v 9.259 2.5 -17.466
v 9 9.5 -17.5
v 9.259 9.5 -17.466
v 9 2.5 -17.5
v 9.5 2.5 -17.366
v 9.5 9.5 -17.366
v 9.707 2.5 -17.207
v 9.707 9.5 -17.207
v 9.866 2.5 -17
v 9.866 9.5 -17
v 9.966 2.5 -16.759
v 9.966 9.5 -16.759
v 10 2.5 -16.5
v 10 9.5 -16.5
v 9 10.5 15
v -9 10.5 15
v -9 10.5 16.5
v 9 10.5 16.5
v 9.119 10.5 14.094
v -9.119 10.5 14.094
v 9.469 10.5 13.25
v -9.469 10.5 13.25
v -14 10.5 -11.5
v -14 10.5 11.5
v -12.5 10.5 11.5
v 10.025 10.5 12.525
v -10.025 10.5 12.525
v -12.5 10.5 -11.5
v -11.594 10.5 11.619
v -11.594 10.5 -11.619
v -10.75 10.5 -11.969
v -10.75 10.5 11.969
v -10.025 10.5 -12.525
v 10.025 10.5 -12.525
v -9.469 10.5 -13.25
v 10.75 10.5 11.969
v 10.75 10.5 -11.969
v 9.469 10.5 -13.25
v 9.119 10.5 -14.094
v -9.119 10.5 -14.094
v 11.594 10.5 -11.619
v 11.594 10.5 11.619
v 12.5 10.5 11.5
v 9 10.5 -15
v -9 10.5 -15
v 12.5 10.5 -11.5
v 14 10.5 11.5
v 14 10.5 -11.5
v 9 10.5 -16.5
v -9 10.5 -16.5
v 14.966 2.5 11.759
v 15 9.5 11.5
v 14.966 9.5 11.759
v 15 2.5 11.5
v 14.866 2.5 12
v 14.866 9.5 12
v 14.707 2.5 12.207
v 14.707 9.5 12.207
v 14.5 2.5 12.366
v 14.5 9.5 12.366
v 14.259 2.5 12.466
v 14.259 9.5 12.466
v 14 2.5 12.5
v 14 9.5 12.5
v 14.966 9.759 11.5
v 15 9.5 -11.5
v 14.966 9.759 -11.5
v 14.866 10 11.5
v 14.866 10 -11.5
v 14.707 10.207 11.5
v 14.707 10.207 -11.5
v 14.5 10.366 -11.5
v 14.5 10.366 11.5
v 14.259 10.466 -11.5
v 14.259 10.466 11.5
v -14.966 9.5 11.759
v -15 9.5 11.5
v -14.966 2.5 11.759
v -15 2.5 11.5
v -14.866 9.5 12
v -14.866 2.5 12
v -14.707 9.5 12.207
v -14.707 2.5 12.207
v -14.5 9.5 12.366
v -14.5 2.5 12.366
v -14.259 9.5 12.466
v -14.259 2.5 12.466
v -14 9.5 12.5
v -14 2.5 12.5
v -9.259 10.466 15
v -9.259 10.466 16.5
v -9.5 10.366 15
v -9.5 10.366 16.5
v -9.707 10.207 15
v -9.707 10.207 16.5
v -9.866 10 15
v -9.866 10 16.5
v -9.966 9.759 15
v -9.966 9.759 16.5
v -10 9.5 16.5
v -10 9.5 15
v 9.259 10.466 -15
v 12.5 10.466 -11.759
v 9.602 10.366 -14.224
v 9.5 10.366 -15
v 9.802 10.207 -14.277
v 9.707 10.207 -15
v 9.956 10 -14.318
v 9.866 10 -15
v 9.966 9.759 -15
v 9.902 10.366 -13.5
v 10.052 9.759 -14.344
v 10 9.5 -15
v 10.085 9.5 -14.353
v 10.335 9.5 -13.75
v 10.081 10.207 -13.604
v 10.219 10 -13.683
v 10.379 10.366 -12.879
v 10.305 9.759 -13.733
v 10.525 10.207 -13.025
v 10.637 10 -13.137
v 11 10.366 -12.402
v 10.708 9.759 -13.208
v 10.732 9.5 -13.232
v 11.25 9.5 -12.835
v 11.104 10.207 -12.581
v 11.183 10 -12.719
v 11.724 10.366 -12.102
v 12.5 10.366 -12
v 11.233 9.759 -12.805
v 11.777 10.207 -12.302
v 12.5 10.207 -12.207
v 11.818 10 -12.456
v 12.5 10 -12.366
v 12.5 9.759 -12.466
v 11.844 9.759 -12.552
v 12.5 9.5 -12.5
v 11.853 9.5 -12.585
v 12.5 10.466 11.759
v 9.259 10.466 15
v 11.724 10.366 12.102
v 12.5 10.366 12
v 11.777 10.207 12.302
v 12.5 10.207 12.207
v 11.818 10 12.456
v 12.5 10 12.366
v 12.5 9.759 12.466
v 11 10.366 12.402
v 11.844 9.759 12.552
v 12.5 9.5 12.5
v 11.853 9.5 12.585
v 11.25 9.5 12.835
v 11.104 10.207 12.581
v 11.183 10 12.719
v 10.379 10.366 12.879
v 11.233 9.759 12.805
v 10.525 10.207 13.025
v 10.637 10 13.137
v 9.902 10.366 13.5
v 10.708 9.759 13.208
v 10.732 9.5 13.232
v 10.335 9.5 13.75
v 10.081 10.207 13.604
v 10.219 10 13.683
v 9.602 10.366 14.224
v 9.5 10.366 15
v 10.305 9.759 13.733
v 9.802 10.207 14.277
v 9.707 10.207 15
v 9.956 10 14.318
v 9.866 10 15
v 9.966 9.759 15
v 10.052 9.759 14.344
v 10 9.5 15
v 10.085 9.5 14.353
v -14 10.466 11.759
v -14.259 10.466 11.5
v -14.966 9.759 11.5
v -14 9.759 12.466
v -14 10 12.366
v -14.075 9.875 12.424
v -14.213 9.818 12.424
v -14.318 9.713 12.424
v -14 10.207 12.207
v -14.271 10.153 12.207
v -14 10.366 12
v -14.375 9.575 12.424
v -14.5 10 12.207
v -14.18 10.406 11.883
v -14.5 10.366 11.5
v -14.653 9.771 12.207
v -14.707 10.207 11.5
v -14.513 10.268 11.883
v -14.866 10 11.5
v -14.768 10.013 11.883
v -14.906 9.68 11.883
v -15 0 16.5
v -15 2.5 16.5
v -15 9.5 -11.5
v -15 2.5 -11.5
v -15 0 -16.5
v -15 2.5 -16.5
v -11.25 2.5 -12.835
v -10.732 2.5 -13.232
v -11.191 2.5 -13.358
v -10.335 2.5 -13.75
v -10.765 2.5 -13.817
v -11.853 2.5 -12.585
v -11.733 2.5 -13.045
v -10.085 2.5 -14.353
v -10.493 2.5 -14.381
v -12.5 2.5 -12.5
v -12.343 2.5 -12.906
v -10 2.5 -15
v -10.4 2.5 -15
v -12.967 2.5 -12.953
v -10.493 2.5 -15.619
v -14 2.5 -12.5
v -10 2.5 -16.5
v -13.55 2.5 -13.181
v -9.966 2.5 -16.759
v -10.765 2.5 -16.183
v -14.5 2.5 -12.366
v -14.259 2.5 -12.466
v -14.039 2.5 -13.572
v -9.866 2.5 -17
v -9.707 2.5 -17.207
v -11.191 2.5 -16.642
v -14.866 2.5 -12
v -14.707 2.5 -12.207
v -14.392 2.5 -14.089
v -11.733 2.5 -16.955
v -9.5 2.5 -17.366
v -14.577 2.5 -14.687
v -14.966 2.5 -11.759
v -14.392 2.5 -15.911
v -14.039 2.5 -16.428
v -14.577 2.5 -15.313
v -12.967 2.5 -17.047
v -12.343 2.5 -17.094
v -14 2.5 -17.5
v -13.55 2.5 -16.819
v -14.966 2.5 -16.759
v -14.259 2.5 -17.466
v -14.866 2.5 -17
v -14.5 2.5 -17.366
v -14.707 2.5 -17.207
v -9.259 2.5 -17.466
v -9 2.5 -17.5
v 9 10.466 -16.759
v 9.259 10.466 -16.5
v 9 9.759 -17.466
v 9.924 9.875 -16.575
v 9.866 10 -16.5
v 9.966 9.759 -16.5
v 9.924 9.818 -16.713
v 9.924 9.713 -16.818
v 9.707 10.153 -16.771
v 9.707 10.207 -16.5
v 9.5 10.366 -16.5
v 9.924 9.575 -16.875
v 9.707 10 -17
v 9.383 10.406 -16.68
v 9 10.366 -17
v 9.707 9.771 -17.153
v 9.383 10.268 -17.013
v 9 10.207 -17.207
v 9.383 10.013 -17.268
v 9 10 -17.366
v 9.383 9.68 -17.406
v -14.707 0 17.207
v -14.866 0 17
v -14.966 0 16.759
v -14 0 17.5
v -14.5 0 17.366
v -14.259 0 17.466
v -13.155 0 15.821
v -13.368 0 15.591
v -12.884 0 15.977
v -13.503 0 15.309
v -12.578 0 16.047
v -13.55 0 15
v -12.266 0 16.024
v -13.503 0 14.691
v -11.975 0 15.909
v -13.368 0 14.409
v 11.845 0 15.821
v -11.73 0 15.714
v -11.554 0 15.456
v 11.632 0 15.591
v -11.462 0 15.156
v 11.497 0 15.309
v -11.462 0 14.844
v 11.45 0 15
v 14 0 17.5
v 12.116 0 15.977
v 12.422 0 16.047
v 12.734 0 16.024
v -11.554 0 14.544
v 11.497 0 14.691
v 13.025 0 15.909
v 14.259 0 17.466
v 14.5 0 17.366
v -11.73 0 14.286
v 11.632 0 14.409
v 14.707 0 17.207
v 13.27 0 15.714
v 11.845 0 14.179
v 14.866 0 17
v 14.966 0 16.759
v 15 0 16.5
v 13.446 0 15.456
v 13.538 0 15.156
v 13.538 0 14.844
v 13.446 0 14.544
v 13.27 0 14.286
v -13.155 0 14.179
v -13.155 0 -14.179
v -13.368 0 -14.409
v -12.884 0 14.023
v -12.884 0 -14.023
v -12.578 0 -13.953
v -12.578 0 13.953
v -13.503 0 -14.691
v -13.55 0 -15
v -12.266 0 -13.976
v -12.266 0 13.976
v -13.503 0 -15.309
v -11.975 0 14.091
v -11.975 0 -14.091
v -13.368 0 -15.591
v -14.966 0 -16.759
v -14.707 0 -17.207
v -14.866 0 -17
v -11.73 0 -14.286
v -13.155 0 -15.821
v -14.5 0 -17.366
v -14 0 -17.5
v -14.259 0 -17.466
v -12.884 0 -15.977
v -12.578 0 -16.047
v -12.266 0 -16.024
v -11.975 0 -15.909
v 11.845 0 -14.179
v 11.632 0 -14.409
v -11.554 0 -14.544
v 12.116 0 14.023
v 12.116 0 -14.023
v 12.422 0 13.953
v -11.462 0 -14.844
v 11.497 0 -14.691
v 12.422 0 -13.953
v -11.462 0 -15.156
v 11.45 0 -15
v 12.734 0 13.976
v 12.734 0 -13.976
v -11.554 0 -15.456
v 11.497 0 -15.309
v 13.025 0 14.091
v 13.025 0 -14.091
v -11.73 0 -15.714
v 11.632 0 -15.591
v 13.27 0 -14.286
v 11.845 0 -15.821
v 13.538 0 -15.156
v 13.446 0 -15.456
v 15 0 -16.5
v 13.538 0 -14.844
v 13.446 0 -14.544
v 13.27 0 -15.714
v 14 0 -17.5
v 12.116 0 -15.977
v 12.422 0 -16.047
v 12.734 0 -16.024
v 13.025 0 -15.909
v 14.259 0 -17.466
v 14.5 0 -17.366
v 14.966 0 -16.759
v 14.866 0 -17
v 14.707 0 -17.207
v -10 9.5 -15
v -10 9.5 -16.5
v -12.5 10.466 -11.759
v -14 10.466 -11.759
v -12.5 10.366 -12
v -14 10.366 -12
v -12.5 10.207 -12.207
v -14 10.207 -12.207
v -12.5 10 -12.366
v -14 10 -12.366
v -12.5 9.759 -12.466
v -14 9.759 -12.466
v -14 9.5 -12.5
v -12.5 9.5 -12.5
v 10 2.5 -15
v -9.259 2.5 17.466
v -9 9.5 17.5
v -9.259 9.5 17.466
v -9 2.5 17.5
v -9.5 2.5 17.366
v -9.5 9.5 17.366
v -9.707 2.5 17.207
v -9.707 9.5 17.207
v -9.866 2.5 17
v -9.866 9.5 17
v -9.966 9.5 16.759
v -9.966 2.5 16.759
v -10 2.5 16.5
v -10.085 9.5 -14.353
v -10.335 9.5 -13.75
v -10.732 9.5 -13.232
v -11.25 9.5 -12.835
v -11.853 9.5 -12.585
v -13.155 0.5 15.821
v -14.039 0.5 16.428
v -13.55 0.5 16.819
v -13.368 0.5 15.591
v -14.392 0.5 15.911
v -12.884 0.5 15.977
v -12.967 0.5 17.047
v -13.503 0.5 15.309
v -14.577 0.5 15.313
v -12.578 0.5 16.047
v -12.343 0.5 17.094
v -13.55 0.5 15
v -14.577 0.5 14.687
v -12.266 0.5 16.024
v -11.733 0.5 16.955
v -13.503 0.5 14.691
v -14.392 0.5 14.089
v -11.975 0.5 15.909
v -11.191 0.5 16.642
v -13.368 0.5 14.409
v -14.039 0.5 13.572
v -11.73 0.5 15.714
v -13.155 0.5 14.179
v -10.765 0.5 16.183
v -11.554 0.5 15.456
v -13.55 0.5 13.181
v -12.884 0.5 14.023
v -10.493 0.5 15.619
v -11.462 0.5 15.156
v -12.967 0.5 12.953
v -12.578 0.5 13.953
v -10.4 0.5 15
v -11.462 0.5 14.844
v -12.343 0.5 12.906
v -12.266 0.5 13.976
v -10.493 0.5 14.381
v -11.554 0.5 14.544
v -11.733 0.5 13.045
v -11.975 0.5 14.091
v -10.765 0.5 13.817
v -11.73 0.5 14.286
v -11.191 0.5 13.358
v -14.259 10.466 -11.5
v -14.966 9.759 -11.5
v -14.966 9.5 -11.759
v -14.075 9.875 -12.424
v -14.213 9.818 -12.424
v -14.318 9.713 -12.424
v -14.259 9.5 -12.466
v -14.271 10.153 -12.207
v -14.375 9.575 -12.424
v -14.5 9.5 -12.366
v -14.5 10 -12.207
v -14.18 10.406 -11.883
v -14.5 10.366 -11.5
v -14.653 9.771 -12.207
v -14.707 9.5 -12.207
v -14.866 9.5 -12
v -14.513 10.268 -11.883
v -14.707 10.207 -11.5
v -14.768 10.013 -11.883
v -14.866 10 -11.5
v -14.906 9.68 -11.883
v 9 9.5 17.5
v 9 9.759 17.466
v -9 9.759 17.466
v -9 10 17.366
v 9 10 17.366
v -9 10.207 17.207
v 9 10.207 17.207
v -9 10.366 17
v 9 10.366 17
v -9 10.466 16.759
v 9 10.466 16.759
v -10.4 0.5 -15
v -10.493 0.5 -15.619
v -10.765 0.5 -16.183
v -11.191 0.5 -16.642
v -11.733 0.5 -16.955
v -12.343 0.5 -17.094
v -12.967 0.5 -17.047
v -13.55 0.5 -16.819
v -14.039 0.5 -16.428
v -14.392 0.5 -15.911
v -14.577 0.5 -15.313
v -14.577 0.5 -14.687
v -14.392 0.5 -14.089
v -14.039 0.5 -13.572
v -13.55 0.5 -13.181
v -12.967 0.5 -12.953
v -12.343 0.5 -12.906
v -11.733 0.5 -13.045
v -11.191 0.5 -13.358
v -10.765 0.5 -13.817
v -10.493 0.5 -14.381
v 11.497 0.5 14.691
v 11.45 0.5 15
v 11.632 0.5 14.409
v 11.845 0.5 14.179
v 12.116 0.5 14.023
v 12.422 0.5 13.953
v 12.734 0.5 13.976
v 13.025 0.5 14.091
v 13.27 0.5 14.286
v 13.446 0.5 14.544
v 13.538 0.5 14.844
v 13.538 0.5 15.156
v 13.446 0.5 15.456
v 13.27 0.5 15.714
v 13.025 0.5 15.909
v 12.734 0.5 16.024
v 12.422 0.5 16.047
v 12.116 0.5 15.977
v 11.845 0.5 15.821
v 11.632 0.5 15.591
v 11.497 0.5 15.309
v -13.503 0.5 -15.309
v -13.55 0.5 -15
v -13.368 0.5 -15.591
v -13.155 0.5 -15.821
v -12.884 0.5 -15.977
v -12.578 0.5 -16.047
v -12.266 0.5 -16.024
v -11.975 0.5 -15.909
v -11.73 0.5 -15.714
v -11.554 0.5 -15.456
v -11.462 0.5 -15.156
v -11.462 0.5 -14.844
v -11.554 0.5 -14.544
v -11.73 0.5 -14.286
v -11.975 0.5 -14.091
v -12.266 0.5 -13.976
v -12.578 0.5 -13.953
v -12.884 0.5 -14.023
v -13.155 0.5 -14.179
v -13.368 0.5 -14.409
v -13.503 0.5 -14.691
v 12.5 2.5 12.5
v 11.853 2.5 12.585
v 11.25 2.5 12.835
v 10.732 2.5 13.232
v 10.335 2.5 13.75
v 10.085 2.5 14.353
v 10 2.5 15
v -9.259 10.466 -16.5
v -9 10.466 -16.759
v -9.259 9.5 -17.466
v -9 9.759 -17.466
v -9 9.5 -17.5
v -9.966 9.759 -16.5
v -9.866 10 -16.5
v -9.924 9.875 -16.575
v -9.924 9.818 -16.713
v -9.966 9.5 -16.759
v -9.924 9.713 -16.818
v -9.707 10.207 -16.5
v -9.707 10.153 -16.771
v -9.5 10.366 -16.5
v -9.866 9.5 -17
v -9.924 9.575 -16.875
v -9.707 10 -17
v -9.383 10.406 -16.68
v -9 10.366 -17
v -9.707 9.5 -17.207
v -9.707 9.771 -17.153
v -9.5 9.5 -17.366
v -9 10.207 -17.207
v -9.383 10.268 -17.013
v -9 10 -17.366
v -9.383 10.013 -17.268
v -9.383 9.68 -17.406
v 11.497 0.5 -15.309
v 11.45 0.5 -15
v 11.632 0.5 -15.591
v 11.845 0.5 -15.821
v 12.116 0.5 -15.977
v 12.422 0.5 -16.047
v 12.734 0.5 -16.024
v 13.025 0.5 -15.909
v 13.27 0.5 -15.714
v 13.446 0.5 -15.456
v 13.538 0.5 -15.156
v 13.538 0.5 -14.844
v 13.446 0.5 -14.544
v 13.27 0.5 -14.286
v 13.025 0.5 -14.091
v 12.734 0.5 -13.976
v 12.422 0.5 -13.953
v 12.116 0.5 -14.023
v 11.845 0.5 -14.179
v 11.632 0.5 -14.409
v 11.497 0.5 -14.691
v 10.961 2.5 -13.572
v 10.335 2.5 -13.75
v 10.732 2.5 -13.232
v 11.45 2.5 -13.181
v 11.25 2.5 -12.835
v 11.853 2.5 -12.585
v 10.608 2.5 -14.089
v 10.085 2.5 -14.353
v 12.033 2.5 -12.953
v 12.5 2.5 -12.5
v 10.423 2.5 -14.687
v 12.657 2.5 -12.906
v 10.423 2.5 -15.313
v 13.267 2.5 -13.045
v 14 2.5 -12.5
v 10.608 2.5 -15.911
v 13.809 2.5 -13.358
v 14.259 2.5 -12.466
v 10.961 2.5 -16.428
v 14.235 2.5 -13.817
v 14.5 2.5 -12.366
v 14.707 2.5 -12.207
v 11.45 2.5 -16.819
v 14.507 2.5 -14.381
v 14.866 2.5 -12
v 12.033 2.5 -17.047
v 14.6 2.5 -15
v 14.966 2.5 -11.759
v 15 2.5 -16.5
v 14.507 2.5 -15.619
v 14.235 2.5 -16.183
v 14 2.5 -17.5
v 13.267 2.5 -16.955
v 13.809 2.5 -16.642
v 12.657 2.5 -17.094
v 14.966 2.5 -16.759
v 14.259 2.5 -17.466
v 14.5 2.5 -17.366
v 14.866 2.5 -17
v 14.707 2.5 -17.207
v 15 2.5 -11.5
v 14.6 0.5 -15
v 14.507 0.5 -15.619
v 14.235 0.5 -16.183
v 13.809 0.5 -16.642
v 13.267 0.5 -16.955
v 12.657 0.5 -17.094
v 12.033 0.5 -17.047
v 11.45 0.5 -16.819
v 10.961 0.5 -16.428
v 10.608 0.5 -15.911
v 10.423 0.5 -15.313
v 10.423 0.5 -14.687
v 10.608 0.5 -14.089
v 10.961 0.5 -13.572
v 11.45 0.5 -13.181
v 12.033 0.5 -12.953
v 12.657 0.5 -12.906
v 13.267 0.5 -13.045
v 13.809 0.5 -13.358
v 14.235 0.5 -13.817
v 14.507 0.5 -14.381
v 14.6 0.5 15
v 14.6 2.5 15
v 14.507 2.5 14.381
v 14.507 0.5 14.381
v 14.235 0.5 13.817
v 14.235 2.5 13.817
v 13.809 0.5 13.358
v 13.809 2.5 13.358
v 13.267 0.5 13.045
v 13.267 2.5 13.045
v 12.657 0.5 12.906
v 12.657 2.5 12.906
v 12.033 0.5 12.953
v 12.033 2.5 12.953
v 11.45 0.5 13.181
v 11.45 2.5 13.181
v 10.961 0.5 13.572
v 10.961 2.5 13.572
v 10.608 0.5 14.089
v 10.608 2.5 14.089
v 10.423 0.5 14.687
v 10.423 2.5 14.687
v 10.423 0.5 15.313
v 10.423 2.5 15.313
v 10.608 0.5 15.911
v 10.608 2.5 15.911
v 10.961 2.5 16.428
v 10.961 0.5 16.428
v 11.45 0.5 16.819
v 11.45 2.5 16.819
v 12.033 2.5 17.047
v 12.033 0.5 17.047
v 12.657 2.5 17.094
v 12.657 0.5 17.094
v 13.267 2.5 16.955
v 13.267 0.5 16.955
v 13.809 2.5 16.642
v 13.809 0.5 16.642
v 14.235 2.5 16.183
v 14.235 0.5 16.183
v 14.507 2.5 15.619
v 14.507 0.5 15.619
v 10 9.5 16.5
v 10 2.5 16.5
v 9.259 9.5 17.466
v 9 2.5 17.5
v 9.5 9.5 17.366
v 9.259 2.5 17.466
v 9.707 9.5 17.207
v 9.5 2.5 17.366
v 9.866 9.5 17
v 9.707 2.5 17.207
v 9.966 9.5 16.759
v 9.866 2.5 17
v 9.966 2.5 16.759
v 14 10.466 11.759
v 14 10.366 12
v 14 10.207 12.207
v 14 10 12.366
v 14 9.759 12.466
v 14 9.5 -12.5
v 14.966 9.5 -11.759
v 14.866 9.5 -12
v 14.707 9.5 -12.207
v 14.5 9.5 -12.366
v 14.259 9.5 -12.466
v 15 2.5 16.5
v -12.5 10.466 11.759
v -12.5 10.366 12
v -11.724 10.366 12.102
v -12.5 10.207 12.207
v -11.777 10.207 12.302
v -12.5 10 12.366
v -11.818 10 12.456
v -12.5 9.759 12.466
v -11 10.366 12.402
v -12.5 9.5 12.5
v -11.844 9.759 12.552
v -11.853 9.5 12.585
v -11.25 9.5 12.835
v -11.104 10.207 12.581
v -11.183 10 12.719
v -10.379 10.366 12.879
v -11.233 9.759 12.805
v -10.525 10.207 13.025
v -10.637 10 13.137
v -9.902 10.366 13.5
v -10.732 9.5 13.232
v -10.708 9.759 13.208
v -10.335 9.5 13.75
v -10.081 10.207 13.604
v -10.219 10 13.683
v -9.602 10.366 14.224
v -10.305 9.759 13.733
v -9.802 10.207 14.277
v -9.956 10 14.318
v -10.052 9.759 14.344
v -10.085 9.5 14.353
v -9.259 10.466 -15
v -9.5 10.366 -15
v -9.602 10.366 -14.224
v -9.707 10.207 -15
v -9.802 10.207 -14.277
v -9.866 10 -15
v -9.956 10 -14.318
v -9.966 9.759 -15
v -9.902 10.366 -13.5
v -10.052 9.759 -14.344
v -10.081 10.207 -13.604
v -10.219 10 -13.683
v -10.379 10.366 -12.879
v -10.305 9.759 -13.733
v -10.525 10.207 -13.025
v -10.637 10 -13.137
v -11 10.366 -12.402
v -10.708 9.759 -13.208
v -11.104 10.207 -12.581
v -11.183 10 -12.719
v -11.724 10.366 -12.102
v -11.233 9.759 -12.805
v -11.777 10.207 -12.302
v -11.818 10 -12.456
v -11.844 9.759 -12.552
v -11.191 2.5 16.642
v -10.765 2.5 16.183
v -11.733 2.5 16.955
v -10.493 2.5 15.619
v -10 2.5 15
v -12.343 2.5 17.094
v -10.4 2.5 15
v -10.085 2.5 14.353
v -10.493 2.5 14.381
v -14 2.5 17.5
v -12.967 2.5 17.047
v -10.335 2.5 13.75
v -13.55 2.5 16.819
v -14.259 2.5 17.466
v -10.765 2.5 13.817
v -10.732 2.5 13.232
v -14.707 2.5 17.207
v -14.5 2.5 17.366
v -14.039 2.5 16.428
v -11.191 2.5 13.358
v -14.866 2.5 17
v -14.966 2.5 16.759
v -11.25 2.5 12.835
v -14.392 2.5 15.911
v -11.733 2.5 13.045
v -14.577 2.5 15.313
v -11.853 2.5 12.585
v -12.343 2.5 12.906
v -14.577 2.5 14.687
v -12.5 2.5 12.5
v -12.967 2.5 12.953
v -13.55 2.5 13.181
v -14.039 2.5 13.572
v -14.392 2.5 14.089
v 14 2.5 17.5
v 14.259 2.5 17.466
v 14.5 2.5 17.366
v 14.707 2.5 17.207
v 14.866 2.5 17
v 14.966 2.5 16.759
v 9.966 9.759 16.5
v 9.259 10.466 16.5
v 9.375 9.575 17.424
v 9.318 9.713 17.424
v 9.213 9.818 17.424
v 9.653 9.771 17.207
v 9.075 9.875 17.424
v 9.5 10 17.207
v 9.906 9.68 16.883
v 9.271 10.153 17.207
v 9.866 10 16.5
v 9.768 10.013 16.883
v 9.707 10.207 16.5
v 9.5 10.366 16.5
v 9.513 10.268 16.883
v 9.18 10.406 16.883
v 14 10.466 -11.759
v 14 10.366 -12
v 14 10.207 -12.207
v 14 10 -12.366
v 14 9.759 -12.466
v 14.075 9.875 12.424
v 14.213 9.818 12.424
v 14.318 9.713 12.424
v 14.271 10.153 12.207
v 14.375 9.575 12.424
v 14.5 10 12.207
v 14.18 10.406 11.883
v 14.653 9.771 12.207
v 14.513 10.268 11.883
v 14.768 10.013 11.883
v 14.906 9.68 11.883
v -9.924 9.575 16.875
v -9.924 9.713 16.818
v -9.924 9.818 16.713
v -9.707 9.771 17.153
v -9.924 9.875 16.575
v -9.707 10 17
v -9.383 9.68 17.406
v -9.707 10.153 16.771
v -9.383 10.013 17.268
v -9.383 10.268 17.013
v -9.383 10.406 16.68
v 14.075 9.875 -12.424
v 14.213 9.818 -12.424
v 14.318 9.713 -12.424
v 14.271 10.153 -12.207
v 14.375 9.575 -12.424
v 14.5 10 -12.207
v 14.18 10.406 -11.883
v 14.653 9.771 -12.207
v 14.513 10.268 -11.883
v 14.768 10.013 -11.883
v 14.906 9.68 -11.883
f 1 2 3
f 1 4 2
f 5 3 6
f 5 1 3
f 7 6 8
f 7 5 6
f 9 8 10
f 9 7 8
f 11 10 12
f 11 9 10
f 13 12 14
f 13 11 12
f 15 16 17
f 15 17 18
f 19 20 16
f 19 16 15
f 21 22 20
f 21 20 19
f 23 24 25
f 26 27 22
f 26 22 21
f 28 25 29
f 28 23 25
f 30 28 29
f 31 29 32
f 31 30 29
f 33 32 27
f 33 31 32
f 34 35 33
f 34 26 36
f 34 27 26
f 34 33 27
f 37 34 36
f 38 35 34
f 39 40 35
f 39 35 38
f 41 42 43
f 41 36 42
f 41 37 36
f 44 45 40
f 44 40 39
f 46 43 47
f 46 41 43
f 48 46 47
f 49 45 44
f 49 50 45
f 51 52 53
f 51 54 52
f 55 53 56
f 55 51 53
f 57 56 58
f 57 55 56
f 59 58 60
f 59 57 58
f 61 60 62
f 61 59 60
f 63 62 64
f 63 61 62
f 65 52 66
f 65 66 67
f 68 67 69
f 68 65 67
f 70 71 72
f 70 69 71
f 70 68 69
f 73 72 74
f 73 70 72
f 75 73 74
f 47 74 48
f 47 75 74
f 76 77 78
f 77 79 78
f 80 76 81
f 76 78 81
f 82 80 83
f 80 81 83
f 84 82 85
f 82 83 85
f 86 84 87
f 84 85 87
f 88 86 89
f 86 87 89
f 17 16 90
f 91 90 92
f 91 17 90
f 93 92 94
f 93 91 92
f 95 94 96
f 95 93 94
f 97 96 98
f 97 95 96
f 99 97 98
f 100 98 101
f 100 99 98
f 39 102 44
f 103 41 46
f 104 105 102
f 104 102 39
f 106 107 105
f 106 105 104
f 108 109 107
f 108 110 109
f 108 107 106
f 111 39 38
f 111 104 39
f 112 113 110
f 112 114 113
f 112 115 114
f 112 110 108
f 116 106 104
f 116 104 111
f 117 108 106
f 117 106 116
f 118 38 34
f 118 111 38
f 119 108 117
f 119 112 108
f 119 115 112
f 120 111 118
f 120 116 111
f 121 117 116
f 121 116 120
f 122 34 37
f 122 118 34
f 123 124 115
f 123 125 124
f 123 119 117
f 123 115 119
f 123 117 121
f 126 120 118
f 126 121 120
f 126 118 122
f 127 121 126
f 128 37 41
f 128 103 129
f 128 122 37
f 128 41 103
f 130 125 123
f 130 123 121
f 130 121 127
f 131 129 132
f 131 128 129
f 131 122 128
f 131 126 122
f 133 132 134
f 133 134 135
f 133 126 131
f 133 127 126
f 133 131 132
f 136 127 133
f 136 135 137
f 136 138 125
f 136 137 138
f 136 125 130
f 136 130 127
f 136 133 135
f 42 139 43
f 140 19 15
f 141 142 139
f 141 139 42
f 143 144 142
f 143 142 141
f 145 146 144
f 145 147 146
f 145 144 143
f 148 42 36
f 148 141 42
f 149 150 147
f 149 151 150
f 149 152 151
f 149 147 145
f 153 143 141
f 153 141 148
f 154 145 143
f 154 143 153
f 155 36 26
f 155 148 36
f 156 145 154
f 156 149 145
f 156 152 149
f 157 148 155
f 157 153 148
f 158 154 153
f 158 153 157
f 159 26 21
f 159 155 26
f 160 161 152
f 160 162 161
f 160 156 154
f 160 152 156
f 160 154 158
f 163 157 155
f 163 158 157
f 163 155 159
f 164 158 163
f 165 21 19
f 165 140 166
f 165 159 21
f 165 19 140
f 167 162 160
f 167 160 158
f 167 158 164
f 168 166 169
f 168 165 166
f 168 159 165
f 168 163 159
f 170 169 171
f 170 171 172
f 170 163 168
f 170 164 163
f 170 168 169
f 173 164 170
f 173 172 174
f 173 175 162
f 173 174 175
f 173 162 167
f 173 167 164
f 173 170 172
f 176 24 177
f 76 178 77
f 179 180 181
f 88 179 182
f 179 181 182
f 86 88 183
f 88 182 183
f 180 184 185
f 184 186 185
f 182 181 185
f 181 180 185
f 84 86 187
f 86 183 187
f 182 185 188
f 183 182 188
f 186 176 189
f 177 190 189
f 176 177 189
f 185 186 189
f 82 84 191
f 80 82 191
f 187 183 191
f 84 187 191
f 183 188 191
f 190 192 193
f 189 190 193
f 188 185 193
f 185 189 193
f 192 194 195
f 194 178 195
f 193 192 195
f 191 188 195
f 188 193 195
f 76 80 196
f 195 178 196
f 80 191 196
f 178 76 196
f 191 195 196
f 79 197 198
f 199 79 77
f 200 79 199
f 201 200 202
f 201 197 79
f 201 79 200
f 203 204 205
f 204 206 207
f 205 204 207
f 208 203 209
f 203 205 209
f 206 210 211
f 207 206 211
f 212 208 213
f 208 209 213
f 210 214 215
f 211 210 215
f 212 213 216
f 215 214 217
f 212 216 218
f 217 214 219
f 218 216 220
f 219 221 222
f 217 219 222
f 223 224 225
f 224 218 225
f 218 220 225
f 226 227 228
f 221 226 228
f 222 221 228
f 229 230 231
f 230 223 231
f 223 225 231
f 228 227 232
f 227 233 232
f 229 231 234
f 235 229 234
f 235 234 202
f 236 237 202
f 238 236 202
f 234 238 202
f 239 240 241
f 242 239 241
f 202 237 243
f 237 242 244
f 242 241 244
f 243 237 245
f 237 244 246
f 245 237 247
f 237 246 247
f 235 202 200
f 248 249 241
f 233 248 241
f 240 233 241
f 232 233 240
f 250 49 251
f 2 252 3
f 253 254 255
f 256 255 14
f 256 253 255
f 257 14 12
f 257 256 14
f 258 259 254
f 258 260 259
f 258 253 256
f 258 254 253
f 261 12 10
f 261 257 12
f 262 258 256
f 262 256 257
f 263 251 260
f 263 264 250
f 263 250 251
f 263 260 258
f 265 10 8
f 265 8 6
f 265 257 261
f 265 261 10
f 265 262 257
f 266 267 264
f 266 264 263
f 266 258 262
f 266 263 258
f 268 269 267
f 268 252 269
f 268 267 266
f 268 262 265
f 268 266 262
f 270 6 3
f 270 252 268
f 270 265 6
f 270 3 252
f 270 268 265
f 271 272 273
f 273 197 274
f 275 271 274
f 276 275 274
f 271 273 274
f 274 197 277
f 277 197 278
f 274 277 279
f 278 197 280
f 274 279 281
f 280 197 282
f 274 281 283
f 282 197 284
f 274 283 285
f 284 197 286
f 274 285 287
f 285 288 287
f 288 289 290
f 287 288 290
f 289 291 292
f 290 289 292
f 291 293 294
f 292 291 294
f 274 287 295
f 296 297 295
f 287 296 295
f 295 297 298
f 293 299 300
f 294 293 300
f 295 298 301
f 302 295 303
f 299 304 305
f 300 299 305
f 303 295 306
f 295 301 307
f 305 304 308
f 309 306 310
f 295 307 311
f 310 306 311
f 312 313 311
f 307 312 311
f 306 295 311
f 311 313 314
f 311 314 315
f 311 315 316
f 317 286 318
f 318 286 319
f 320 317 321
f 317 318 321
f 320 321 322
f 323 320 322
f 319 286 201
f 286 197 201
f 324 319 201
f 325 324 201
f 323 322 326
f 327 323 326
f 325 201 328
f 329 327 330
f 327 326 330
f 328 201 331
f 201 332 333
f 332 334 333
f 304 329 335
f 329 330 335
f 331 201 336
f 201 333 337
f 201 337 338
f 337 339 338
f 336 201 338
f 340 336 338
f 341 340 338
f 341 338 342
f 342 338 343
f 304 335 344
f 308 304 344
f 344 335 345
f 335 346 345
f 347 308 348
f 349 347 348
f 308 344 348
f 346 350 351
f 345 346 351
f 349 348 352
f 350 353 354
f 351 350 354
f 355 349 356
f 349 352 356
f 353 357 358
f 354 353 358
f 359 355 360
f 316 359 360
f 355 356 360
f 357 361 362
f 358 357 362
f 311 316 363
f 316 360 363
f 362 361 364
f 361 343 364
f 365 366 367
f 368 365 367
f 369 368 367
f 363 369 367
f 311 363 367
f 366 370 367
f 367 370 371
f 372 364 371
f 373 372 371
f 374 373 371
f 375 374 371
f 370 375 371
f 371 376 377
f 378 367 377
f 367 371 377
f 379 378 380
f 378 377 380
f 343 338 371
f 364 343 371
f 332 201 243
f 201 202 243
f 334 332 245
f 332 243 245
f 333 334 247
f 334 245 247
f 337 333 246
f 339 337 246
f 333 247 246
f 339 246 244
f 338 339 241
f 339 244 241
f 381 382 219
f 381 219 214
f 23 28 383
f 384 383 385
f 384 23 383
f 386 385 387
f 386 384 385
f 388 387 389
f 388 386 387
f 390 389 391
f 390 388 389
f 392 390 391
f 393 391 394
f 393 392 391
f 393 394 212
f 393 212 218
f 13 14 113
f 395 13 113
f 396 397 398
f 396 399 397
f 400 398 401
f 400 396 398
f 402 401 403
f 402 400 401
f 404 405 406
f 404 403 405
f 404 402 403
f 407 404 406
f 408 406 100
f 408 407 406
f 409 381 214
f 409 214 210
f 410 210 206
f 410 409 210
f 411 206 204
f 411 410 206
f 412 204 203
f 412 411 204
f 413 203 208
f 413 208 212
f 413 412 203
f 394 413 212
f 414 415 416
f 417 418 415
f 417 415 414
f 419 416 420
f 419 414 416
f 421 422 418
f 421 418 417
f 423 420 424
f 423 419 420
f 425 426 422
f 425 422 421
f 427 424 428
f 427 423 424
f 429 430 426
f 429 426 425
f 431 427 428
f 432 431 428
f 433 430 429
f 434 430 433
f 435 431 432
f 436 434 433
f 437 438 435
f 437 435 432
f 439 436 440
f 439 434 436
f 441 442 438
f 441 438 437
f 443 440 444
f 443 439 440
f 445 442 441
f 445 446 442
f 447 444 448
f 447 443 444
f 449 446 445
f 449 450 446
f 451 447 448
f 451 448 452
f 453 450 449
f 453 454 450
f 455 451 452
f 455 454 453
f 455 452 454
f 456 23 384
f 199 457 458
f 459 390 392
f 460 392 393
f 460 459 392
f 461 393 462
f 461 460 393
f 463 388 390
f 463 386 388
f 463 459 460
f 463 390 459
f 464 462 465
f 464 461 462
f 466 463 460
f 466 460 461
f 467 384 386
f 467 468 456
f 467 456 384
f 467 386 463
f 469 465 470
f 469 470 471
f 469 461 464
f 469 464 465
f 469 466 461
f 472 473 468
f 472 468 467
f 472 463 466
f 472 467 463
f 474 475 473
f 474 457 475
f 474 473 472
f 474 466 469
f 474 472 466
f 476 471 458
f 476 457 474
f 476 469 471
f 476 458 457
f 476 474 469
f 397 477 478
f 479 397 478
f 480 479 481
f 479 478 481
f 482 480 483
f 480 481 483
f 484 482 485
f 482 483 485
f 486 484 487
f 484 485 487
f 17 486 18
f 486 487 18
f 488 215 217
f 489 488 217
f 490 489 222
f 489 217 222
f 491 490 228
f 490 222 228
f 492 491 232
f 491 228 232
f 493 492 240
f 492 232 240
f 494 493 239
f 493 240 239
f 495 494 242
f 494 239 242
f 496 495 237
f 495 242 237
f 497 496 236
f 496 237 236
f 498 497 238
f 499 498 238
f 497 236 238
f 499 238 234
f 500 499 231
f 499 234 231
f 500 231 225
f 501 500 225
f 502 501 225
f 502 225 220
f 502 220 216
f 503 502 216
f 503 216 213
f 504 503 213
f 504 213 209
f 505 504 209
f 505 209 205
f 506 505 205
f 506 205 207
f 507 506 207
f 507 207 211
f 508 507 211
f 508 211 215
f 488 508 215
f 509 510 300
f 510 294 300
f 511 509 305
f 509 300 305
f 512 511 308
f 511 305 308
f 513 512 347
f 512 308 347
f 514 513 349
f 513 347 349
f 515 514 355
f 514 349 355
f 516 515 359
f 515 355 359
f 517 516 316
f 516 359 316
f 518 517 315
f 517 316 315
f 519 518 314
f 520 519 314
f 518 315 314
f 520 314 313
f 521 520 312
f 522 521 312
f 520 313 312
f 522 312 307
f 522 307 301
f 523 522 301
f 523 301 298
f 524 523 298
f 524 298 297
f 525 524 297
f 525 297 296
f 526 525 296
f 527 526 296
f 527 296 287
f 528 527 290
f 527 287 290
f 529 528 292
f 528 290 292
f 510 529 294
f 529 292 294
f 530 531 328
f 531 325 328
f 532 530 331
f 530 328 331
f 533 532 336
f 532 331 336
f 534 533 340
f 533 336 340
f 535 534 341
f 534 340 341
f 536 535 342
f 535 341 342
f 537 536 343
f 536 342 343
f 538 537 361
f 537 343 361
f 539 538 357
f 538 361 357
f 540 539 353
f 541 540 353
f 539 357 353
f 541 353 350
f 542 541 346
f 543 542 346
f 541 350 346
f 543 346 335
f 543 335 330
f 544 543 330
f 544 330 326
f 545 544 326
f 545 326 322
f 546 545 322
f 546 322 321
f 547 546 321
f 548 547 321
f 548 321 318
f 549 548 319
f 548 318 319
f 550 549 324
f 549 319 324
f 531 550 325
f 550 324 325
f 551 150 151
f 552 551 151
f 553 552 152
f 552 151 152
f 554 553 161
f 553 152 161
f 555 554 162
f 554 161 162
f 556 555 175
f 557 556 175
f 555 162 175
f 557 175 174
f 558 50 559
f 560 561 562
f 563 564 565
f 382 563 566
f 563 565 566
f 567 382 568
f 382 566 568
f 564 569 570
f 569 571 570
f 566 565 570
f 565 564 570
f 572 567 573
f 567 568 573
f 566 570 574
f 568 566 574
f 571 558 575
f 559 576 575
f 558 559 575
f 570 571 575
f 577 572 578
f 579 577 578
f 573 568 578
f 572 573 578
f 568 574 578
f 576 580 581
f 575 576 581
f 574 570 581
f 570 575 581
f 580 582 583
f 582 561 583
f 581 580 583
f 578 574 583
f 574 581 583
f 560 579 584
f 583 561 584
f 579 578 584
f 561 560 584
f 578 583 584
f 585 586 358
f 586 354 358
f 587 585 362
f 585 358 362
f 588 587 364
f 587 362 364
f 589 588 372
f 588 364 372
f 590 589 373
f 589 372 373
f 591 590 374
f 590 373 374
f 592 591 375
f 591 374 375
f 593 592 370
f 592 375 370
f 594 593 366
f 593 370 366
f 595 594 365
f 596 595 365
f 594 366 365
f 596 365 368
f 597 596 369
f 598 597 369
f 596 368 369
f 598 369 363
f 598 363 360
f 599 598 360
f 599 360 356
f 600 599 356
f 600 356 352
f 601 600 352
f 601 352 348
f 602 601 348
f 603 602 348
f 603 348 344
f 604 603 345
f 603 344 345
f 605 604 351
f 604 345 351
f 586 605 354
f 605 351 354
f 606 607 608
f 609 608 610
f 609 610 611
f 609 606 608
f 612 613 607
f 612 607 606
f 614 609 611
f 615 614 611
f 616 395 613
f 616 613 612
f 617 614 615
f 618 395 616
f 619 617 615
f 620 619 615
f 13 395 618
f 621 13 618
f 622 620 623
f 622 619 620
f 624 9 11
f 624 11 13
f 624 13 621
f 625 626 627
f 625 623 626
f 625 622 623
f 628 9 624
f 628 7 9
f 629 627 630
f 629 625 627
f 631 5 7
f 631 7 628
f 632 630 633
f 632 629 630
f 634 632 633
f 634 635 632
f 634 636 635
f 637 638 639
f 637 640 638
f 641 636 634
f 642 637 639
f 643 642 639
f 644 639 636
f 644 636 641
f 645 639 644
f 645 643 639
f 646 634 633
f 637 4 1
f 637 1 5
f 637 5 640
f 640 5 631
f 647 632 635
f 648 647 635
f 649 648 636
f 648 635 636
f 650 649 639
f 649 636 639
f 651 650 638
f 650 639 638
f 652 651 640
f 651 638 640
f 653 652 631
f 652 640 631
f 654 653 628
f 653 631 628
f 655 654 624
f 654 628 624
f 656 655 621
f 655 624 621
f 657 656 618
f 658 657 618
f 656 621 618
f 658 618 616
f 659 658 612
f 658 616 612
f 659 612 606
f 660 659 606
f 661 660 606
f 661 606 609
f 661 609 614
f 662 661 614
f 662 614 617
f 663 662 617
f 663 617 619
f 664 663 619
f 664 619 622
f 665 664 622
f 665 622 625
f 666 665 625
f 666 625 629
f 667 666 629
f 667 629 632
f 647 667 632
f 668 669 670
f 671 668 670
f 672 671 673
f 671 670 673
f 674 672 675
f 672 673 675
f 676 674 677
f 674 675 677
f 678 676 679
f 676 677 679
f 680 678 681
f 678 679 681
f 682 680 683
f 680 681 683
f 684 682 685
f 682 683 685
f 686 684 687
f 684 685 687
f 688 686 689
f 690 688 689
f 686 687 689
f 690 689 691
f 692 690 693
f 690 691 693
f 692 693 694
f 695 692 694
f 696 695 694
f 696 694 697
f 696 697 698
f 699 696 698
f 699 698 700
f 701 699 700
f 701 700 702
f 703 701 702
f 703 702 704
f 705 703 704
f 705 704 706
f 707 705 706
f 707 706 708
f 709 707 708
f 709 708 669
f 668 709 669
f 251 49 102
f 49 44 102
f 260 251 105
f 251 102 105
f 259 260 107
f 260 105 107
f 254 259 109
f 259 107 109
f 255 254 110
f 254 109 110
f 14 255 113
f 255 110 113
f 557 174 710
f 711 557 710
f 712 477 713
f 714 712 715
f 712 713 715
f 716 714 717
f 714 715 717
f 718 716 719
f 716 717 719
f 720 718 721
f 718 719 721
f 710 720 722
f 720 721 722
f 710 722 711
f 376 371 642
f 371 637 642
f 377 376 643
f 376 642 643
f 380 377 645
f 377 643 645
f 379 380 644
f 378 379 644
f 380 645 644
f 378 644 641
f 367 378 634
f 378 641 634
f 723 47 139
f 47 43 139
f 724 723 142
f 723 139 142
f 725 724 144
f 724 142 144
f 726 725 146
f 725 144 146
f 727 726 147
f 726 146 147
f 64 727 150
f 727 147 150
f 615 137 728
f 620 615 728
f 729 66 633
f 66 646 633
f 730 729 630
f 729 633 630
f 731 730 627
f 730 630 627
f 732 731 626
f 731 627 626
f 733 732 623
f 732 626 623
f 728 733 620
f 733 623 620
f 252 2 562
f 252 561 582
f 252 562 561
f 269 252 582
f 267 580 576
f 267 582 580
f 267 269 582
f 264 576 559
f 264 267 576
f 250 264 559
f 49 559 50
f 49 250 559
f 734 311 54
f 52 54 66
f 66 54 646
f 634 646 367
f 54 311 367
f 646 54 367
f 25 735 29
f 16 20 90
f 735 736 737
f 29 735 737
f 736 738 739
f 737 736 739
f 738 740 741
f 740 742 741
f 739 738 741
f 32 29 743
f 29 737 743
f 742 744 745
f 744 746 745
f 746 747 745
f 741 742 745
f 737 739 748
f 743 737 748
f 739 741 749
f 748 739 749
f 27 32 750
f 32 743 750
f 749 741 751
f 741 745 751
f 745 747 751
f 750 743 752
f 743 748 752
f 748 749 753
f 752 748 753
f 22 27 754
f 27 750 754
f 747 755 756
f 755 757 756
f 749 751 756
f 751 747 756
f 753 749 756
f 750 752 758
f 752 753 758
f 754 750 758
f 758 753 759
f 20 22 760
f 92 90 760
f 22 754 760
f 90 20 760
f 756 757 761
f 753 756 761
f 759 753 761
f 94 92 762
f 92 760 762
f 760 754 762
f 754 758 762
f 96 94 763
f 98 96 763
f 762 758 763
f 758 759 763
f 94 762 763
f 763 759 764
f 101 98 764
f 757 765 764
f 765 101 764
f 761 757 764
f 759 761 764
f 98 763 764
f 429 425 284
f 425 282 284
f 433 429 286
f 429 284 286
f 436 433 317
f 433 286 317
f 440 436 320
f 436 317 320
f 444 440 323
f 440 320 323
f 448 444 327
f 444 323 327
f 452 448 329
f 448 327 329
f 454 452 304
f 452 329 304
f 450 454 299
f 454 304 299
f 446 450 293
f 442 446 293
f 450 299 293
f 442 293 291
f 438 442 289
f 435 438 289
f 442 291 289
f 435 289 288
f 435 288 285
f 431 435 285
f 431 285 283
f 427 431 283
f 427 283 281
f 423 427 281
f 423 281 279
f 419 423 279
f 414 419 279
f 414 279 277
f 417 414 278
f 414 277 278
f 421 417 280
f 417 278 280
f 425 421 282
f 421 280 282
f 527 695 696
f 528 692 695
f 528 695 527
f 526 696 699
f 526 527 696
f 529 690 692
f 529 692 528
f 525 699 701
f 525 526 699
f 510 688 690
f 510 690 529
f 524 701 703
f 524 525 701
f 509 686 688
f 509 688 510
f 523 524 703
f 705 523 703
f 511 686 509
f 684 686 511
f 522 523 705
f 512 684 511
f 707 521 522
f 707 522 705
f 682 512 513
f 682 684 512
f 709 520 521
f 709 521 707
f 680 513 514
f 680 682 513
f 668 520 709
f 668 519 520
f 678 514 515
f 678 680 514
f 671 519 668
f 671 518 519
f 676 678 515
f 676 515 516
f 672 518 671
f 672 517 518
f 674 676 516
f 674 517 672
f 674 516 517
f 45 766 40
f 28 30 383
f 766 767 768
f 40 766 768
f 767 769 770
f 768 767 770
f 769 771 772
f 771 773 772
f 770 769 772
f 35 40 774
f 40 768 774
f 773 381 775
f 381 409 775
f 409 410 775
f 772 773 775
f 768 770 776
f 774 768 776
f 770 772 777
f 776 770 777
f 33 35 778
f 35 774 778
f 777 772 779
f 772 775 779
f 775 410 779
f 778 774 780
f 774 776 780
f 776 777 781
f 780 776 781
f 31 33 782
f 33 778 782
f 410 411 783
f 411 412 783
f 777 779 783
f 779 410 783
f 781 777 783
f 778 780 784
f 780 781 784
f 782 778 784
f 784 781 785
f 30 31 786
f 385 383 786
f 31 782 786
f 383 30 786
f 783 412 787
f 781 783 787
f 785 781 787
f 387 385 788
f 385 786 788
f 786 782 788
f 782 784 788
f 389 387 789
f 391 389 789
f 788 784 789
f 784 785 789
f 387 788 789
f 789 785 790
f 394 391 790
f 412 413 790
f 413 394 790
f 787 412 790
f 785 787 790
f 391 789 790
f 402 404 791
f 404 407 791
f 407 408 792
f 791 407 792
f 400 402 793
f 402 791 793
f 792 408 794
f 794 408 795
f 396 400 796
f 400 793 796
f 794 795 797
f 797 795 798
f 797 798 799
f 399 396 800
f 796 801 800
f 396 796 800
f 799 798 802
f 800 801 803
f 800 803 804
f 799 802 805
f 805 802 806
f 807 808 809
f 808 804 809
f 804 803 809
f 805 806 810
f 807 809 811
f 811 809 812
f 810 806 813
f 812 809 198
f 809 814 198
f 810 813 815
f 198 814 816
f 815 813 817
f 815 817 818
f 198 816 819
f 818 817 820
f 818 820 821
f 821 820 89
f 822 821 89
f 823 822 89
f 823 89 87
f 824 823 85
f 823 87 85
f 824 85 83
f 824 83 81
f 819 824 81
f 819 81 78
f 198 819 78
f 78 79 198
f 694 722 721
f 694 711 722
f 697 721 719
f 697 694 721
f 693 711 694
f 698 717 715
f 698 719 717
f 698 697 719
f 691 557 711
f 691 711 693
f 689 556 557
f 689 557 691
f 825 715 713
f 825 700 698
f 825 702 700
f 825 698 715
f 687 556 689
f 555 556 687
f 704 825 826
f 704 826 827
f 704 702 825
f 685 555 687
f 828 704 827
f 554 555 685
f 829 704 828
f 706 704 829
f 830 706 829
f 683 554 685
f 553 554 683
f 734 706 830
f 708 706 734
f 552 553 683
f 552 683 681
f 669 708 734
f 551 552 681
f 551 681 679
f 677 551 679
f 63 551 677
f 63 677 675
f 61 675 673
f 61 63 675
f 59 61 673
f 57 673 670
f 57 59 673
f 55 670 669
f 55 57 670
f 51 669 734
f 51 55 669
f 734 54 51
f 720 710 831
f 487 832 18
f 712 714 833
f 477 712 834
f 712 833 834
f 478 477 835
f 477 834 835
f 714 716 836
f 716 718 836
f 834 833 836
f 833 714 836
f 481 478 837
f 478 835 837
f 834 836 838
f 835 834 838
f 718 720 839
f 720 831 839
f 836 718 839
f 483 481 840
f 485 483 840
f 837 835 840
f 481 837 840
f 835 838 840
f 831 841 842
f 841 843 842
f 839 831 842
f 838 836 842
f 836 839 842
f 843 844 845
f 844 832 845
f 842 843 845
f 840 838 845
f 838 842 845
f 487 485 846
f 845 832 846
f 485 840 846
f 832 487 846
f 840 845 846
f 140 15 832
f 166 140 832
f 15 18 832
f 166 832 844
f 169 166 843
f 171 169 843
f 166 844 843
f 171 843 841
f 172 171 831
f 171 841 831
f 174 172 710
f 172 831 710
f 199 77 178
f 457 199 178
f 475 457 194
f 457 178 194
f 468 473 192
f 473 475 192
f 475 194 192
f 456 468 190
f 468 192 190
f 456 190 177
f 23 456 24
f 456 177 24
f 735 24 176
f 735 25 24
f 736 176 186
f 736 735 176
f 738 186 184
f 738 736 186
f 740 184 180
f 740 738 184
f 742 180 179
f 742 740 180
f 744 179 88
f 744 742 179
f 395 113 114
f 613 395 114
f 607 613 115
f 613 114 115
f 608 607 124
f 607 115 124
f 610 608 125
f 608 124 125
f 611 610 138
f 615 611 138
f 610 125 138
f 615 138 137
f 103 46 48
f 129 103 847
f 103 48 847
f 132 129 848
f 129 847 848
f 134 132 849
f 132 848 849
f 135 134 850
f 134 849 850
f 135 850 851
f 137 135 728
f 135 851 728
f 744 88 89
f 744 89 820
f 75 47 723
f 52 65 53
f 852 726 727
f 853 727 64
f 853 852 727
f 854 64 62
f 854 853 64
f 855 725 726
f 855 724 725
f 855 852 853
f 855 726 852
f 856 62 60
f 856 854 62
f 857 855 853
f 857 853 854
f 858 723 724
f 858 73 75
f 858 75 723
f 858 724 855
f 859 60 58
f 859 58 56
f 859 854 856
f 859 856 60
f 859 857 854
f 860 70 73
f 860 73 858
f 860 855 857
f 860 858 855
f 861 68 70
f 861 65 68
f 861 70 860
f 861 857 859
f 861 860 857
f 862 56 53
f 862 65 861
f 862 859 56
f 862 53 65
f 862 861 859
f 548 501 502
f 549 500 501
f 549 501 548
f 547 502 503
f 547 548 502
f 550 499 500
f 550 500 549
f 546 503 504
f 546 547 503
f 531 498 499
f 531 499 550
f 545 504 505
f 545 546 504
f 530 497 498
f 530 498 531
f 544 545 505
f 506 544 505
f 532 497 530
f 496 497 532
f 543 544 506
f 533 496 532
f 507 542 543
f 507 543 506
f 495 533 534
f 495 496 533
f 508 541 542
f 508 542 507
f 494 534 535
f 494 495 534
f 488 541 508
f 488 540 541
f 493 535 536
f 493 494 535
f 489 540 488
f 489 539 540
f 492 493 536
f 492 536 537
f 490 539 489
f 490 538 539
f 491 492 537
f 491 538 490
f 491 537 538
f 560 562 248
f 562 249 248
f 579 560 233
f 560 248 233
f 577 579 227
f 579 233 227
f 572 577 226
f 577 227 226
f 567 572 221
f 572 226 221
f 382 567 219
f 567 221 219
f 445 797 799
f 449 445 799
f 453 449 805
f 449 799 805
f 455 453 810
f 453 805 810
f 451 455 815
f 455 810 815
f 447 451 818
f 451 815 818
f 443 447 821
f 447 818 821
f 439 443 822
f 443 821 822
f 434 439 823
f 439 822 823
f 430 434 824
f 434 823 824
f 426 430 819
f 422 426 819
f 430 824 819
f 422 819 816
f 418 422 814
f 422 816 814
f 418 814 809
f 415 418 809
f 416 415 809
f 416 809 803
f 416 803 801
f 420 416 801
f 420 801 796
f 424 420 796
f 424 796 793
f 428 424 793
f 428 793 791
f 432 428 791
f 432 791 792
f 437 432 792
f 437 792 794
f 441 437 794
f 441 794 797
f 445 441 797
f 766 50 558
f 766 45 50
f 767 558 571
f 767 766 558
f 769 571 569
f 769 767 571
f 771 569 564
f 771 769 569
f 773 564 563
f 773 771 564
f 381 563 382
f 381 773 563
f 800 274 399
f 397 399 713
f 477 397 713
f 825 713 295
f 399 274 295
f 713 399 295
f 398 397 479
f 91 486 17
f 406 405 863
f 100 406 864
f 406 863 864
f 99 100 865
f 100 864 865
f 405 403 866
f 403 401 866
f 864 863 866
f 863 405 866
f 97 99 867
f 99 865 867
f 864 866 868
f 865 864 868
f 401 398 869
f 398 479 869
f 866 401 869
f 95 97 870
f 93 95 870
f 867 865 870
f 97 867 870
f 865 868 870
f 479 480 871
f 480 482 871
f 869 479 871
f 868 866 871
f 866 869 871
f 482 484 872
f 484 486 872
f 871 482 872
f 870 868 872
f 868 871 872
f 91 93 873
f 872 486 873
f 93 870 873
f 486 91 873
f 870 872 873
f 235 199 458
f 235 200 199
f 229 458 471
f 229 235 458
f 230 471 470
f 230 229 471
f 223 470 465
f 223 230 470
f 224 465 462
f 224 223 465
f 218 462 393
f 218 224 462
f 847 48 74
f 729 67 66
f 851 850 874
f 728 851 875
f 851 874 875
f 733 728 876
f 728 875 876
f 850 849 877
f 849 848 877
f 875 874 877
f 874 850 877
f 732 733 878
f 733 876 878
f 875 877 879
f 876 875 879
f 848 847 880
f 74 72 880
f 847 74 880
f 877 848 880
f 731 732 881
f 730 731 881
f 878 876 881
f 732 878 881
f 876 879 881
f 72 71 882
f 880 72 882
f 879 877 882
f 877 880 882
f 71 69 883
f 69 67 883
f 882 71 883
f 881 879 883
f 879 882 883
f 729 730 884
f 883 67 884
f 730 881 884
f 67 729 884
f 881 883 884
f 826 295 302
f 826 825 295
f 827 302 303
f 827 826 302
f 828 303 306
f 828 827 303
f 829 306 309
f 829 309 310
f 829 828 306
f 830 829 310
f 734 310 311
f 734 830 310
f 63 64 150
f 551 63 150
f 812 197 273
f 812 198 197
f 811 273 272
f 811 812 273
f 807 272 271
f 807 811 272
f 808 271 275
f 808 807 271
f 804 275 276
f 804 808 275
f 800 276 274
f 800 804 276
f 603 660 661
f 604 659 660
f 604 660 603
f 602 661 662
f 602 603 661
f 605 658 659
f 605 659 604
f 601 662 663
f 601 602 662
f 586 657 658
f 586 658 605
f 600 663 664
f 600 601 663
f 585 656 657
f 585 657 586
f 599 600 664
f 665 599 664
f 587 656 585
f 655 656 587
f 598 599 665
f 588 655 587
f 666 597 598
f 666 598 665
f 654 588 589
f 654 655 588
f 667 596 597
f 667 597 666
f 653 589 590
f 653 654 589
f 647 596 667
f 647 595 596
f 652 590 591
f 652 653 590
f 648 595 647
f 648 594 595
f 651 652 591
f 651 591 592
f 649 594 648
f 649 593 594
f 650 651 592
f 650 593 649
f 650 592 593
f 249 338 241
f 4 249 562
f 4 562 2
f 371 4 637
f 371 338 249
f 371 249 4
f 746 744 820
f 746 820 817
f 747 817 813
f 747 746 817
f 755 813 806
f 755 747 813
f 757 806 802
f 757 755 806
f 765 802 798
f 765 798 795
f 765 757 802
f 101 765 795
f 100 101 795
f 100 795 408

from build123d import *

# Parameters (mm, degrees)
SKETCH_1_W                   = 30
SKETCH_1_H                   = 35
EXTRUDE_1_DEPTH              = 10.5
CUT_EXTRUDE_1_DEPTH          = 8
FILLET_1_R                   = 1
HOLE_WIZARD_M2_1_D           = 2.1
HOLE_WIZARD_M2_1_DEPTH       = 20
HOLE_WIZARD_M2_1_CBORE_D     = 4.2
HOLE_WIZARD_M2_1_CBORE_DEPTH = 2
HOLE_WIZARD_M2_1_TIP         = 0.63090365


with BuildPart() as part:
    # ｽｹｯﾁ1 → ﾎﾞｽ - 押し出し1 (new body)
    with BuildSketch(Plane(origin=(0, 0, 0), x_dir=(1, 0, 0), z_dir=(0, 1, 0))):
        Rectangle(SKETCH_1_W, SKETCH_1_H)
    extrude(amount=EXTRUDE_1_DEPTH)

    # ｽｹｯﾁ2 → ｶｯﾄ - 押し出し1 (cut)
    with BuildSketch(Plane(origin=(0, 10.5, 0), x_dir=(1, 0, 0), z_dir=(0, 1, 0))):
        with BuildLine():
            Line((15, 12.5), (15, -12.5))
            Line((15, -12.5), (12.5, -12.5))
            ThreePointArc((12.5, -12.5), (10.732233047, -13.232233047), (10, -15))
            Line((10, -15), (10, -17.5))
            Line((10, -17.5), (12.5, -17.5))
            Line((12.5, -17.5), (17, -17.5))
            Line((17, -17.5), (17, 17.5))
            Line((17, 17.5), (12.5, 17.5))
            Line((12.5, 17.5), (10, 17.5))
            Line((10, 17.5), (10, 15))
            ThreePointArc((10, 15), (10.732233047, 13.232233047), (12.5, 12.5))
            Line((12.5, 12.5), (15, 12.5))
        make_face()
    cut_extrude_1 = extrude(amount=-CUT_EXTRUDE_1_DEPTH, mode=Mode.SUBTRACT)

    # ﾐﾗｰ1: ｶｯﾄ - 押し出し1 across plane
    add(cut_extrude_1.mirror(Plane(origin=(0, 0, 0), x_dir=(0, 0, 1), z_dir=(1, 0, 0))), mode=Mode.SUBTRACT)

    # ﾌｨﾚｯﾄ1
    fillet_1_edges = [part.edges().sort_by_distance(p)[0] for p in [
        (15, 10.5, 0),
        (0, 10.5, -17.5),
        (15, 1.25, 17.5),
        (15, 1.25, -17.5),
        (13.75, 10.5, 12.5),
        (10.732233047, 10.5, 13.232233047),
        (10, 10.5, 16.25),
        (13.75, 10.5, -12.5),
        (10, 10.5, -16.25),
        (10.732233047, 10.5, -13.232233047),
        (10, 6.5, -17.5),
        (10, 6.5, 17.5),
        (15, 6.5, 12.5),
        (15, 6.5, -12.5),
        (-15, 10.5, 0),
        (0, 10.5, 17.5),
        (-15, 1.25, 17.5),
        (-15, 1.25, -17.5),
        (-10, 6.5, 17.5),
        (-10.732233047, 10.5, -13.232233047),
        (-13.75, 10.5, -12.5),
        (-15, 6.5, -12.5),
        (-13.75, 10.5, 12.5),
        (-15, 6.5, 12.5),
        (-10.732233047, 10.5, 13.232233047),
        (-10, 10.5, 16.25),
        (-10, 10.5, -16.25),
        (-10, 6.5, -17.5),
    ]]
    fillet(fillet_1_edges, radius=FILLET_1_R)

    # M2 なべ頭ねじ用座ぐり穴1
    with Locations(Plane(origin=(0, 2.5, 0), x_dir=(1, 0, 0), z_dir=(0, 1, 0))):
        with Locations((12.5, -15), (12.5, 15), (-12.5, 15), (-12.5, -15)):
            CounterBoreHole(HOLE_WIZARD_M2_1_D / 2, HOLE_WIZARD_M2_1_CBORE_D / 2, HOLE_WIZARD_M2_1_CBORE_DEPTH, depth=HOLE_WIZARD_M2_1_DEPTH)
            with Locations((0, 0, -(HOLE_WIZARD_M2_1_DEPTH + HOLE_WIZARD_M2_1_TIP / 2))):  # 118° drill point
                Cone(0, HOLE_WIZARD_M2_1_D / 2, HOLE_WIZARD_M2_1_TIP, mode=Mode.SUBTRACT)


solid = part.part
